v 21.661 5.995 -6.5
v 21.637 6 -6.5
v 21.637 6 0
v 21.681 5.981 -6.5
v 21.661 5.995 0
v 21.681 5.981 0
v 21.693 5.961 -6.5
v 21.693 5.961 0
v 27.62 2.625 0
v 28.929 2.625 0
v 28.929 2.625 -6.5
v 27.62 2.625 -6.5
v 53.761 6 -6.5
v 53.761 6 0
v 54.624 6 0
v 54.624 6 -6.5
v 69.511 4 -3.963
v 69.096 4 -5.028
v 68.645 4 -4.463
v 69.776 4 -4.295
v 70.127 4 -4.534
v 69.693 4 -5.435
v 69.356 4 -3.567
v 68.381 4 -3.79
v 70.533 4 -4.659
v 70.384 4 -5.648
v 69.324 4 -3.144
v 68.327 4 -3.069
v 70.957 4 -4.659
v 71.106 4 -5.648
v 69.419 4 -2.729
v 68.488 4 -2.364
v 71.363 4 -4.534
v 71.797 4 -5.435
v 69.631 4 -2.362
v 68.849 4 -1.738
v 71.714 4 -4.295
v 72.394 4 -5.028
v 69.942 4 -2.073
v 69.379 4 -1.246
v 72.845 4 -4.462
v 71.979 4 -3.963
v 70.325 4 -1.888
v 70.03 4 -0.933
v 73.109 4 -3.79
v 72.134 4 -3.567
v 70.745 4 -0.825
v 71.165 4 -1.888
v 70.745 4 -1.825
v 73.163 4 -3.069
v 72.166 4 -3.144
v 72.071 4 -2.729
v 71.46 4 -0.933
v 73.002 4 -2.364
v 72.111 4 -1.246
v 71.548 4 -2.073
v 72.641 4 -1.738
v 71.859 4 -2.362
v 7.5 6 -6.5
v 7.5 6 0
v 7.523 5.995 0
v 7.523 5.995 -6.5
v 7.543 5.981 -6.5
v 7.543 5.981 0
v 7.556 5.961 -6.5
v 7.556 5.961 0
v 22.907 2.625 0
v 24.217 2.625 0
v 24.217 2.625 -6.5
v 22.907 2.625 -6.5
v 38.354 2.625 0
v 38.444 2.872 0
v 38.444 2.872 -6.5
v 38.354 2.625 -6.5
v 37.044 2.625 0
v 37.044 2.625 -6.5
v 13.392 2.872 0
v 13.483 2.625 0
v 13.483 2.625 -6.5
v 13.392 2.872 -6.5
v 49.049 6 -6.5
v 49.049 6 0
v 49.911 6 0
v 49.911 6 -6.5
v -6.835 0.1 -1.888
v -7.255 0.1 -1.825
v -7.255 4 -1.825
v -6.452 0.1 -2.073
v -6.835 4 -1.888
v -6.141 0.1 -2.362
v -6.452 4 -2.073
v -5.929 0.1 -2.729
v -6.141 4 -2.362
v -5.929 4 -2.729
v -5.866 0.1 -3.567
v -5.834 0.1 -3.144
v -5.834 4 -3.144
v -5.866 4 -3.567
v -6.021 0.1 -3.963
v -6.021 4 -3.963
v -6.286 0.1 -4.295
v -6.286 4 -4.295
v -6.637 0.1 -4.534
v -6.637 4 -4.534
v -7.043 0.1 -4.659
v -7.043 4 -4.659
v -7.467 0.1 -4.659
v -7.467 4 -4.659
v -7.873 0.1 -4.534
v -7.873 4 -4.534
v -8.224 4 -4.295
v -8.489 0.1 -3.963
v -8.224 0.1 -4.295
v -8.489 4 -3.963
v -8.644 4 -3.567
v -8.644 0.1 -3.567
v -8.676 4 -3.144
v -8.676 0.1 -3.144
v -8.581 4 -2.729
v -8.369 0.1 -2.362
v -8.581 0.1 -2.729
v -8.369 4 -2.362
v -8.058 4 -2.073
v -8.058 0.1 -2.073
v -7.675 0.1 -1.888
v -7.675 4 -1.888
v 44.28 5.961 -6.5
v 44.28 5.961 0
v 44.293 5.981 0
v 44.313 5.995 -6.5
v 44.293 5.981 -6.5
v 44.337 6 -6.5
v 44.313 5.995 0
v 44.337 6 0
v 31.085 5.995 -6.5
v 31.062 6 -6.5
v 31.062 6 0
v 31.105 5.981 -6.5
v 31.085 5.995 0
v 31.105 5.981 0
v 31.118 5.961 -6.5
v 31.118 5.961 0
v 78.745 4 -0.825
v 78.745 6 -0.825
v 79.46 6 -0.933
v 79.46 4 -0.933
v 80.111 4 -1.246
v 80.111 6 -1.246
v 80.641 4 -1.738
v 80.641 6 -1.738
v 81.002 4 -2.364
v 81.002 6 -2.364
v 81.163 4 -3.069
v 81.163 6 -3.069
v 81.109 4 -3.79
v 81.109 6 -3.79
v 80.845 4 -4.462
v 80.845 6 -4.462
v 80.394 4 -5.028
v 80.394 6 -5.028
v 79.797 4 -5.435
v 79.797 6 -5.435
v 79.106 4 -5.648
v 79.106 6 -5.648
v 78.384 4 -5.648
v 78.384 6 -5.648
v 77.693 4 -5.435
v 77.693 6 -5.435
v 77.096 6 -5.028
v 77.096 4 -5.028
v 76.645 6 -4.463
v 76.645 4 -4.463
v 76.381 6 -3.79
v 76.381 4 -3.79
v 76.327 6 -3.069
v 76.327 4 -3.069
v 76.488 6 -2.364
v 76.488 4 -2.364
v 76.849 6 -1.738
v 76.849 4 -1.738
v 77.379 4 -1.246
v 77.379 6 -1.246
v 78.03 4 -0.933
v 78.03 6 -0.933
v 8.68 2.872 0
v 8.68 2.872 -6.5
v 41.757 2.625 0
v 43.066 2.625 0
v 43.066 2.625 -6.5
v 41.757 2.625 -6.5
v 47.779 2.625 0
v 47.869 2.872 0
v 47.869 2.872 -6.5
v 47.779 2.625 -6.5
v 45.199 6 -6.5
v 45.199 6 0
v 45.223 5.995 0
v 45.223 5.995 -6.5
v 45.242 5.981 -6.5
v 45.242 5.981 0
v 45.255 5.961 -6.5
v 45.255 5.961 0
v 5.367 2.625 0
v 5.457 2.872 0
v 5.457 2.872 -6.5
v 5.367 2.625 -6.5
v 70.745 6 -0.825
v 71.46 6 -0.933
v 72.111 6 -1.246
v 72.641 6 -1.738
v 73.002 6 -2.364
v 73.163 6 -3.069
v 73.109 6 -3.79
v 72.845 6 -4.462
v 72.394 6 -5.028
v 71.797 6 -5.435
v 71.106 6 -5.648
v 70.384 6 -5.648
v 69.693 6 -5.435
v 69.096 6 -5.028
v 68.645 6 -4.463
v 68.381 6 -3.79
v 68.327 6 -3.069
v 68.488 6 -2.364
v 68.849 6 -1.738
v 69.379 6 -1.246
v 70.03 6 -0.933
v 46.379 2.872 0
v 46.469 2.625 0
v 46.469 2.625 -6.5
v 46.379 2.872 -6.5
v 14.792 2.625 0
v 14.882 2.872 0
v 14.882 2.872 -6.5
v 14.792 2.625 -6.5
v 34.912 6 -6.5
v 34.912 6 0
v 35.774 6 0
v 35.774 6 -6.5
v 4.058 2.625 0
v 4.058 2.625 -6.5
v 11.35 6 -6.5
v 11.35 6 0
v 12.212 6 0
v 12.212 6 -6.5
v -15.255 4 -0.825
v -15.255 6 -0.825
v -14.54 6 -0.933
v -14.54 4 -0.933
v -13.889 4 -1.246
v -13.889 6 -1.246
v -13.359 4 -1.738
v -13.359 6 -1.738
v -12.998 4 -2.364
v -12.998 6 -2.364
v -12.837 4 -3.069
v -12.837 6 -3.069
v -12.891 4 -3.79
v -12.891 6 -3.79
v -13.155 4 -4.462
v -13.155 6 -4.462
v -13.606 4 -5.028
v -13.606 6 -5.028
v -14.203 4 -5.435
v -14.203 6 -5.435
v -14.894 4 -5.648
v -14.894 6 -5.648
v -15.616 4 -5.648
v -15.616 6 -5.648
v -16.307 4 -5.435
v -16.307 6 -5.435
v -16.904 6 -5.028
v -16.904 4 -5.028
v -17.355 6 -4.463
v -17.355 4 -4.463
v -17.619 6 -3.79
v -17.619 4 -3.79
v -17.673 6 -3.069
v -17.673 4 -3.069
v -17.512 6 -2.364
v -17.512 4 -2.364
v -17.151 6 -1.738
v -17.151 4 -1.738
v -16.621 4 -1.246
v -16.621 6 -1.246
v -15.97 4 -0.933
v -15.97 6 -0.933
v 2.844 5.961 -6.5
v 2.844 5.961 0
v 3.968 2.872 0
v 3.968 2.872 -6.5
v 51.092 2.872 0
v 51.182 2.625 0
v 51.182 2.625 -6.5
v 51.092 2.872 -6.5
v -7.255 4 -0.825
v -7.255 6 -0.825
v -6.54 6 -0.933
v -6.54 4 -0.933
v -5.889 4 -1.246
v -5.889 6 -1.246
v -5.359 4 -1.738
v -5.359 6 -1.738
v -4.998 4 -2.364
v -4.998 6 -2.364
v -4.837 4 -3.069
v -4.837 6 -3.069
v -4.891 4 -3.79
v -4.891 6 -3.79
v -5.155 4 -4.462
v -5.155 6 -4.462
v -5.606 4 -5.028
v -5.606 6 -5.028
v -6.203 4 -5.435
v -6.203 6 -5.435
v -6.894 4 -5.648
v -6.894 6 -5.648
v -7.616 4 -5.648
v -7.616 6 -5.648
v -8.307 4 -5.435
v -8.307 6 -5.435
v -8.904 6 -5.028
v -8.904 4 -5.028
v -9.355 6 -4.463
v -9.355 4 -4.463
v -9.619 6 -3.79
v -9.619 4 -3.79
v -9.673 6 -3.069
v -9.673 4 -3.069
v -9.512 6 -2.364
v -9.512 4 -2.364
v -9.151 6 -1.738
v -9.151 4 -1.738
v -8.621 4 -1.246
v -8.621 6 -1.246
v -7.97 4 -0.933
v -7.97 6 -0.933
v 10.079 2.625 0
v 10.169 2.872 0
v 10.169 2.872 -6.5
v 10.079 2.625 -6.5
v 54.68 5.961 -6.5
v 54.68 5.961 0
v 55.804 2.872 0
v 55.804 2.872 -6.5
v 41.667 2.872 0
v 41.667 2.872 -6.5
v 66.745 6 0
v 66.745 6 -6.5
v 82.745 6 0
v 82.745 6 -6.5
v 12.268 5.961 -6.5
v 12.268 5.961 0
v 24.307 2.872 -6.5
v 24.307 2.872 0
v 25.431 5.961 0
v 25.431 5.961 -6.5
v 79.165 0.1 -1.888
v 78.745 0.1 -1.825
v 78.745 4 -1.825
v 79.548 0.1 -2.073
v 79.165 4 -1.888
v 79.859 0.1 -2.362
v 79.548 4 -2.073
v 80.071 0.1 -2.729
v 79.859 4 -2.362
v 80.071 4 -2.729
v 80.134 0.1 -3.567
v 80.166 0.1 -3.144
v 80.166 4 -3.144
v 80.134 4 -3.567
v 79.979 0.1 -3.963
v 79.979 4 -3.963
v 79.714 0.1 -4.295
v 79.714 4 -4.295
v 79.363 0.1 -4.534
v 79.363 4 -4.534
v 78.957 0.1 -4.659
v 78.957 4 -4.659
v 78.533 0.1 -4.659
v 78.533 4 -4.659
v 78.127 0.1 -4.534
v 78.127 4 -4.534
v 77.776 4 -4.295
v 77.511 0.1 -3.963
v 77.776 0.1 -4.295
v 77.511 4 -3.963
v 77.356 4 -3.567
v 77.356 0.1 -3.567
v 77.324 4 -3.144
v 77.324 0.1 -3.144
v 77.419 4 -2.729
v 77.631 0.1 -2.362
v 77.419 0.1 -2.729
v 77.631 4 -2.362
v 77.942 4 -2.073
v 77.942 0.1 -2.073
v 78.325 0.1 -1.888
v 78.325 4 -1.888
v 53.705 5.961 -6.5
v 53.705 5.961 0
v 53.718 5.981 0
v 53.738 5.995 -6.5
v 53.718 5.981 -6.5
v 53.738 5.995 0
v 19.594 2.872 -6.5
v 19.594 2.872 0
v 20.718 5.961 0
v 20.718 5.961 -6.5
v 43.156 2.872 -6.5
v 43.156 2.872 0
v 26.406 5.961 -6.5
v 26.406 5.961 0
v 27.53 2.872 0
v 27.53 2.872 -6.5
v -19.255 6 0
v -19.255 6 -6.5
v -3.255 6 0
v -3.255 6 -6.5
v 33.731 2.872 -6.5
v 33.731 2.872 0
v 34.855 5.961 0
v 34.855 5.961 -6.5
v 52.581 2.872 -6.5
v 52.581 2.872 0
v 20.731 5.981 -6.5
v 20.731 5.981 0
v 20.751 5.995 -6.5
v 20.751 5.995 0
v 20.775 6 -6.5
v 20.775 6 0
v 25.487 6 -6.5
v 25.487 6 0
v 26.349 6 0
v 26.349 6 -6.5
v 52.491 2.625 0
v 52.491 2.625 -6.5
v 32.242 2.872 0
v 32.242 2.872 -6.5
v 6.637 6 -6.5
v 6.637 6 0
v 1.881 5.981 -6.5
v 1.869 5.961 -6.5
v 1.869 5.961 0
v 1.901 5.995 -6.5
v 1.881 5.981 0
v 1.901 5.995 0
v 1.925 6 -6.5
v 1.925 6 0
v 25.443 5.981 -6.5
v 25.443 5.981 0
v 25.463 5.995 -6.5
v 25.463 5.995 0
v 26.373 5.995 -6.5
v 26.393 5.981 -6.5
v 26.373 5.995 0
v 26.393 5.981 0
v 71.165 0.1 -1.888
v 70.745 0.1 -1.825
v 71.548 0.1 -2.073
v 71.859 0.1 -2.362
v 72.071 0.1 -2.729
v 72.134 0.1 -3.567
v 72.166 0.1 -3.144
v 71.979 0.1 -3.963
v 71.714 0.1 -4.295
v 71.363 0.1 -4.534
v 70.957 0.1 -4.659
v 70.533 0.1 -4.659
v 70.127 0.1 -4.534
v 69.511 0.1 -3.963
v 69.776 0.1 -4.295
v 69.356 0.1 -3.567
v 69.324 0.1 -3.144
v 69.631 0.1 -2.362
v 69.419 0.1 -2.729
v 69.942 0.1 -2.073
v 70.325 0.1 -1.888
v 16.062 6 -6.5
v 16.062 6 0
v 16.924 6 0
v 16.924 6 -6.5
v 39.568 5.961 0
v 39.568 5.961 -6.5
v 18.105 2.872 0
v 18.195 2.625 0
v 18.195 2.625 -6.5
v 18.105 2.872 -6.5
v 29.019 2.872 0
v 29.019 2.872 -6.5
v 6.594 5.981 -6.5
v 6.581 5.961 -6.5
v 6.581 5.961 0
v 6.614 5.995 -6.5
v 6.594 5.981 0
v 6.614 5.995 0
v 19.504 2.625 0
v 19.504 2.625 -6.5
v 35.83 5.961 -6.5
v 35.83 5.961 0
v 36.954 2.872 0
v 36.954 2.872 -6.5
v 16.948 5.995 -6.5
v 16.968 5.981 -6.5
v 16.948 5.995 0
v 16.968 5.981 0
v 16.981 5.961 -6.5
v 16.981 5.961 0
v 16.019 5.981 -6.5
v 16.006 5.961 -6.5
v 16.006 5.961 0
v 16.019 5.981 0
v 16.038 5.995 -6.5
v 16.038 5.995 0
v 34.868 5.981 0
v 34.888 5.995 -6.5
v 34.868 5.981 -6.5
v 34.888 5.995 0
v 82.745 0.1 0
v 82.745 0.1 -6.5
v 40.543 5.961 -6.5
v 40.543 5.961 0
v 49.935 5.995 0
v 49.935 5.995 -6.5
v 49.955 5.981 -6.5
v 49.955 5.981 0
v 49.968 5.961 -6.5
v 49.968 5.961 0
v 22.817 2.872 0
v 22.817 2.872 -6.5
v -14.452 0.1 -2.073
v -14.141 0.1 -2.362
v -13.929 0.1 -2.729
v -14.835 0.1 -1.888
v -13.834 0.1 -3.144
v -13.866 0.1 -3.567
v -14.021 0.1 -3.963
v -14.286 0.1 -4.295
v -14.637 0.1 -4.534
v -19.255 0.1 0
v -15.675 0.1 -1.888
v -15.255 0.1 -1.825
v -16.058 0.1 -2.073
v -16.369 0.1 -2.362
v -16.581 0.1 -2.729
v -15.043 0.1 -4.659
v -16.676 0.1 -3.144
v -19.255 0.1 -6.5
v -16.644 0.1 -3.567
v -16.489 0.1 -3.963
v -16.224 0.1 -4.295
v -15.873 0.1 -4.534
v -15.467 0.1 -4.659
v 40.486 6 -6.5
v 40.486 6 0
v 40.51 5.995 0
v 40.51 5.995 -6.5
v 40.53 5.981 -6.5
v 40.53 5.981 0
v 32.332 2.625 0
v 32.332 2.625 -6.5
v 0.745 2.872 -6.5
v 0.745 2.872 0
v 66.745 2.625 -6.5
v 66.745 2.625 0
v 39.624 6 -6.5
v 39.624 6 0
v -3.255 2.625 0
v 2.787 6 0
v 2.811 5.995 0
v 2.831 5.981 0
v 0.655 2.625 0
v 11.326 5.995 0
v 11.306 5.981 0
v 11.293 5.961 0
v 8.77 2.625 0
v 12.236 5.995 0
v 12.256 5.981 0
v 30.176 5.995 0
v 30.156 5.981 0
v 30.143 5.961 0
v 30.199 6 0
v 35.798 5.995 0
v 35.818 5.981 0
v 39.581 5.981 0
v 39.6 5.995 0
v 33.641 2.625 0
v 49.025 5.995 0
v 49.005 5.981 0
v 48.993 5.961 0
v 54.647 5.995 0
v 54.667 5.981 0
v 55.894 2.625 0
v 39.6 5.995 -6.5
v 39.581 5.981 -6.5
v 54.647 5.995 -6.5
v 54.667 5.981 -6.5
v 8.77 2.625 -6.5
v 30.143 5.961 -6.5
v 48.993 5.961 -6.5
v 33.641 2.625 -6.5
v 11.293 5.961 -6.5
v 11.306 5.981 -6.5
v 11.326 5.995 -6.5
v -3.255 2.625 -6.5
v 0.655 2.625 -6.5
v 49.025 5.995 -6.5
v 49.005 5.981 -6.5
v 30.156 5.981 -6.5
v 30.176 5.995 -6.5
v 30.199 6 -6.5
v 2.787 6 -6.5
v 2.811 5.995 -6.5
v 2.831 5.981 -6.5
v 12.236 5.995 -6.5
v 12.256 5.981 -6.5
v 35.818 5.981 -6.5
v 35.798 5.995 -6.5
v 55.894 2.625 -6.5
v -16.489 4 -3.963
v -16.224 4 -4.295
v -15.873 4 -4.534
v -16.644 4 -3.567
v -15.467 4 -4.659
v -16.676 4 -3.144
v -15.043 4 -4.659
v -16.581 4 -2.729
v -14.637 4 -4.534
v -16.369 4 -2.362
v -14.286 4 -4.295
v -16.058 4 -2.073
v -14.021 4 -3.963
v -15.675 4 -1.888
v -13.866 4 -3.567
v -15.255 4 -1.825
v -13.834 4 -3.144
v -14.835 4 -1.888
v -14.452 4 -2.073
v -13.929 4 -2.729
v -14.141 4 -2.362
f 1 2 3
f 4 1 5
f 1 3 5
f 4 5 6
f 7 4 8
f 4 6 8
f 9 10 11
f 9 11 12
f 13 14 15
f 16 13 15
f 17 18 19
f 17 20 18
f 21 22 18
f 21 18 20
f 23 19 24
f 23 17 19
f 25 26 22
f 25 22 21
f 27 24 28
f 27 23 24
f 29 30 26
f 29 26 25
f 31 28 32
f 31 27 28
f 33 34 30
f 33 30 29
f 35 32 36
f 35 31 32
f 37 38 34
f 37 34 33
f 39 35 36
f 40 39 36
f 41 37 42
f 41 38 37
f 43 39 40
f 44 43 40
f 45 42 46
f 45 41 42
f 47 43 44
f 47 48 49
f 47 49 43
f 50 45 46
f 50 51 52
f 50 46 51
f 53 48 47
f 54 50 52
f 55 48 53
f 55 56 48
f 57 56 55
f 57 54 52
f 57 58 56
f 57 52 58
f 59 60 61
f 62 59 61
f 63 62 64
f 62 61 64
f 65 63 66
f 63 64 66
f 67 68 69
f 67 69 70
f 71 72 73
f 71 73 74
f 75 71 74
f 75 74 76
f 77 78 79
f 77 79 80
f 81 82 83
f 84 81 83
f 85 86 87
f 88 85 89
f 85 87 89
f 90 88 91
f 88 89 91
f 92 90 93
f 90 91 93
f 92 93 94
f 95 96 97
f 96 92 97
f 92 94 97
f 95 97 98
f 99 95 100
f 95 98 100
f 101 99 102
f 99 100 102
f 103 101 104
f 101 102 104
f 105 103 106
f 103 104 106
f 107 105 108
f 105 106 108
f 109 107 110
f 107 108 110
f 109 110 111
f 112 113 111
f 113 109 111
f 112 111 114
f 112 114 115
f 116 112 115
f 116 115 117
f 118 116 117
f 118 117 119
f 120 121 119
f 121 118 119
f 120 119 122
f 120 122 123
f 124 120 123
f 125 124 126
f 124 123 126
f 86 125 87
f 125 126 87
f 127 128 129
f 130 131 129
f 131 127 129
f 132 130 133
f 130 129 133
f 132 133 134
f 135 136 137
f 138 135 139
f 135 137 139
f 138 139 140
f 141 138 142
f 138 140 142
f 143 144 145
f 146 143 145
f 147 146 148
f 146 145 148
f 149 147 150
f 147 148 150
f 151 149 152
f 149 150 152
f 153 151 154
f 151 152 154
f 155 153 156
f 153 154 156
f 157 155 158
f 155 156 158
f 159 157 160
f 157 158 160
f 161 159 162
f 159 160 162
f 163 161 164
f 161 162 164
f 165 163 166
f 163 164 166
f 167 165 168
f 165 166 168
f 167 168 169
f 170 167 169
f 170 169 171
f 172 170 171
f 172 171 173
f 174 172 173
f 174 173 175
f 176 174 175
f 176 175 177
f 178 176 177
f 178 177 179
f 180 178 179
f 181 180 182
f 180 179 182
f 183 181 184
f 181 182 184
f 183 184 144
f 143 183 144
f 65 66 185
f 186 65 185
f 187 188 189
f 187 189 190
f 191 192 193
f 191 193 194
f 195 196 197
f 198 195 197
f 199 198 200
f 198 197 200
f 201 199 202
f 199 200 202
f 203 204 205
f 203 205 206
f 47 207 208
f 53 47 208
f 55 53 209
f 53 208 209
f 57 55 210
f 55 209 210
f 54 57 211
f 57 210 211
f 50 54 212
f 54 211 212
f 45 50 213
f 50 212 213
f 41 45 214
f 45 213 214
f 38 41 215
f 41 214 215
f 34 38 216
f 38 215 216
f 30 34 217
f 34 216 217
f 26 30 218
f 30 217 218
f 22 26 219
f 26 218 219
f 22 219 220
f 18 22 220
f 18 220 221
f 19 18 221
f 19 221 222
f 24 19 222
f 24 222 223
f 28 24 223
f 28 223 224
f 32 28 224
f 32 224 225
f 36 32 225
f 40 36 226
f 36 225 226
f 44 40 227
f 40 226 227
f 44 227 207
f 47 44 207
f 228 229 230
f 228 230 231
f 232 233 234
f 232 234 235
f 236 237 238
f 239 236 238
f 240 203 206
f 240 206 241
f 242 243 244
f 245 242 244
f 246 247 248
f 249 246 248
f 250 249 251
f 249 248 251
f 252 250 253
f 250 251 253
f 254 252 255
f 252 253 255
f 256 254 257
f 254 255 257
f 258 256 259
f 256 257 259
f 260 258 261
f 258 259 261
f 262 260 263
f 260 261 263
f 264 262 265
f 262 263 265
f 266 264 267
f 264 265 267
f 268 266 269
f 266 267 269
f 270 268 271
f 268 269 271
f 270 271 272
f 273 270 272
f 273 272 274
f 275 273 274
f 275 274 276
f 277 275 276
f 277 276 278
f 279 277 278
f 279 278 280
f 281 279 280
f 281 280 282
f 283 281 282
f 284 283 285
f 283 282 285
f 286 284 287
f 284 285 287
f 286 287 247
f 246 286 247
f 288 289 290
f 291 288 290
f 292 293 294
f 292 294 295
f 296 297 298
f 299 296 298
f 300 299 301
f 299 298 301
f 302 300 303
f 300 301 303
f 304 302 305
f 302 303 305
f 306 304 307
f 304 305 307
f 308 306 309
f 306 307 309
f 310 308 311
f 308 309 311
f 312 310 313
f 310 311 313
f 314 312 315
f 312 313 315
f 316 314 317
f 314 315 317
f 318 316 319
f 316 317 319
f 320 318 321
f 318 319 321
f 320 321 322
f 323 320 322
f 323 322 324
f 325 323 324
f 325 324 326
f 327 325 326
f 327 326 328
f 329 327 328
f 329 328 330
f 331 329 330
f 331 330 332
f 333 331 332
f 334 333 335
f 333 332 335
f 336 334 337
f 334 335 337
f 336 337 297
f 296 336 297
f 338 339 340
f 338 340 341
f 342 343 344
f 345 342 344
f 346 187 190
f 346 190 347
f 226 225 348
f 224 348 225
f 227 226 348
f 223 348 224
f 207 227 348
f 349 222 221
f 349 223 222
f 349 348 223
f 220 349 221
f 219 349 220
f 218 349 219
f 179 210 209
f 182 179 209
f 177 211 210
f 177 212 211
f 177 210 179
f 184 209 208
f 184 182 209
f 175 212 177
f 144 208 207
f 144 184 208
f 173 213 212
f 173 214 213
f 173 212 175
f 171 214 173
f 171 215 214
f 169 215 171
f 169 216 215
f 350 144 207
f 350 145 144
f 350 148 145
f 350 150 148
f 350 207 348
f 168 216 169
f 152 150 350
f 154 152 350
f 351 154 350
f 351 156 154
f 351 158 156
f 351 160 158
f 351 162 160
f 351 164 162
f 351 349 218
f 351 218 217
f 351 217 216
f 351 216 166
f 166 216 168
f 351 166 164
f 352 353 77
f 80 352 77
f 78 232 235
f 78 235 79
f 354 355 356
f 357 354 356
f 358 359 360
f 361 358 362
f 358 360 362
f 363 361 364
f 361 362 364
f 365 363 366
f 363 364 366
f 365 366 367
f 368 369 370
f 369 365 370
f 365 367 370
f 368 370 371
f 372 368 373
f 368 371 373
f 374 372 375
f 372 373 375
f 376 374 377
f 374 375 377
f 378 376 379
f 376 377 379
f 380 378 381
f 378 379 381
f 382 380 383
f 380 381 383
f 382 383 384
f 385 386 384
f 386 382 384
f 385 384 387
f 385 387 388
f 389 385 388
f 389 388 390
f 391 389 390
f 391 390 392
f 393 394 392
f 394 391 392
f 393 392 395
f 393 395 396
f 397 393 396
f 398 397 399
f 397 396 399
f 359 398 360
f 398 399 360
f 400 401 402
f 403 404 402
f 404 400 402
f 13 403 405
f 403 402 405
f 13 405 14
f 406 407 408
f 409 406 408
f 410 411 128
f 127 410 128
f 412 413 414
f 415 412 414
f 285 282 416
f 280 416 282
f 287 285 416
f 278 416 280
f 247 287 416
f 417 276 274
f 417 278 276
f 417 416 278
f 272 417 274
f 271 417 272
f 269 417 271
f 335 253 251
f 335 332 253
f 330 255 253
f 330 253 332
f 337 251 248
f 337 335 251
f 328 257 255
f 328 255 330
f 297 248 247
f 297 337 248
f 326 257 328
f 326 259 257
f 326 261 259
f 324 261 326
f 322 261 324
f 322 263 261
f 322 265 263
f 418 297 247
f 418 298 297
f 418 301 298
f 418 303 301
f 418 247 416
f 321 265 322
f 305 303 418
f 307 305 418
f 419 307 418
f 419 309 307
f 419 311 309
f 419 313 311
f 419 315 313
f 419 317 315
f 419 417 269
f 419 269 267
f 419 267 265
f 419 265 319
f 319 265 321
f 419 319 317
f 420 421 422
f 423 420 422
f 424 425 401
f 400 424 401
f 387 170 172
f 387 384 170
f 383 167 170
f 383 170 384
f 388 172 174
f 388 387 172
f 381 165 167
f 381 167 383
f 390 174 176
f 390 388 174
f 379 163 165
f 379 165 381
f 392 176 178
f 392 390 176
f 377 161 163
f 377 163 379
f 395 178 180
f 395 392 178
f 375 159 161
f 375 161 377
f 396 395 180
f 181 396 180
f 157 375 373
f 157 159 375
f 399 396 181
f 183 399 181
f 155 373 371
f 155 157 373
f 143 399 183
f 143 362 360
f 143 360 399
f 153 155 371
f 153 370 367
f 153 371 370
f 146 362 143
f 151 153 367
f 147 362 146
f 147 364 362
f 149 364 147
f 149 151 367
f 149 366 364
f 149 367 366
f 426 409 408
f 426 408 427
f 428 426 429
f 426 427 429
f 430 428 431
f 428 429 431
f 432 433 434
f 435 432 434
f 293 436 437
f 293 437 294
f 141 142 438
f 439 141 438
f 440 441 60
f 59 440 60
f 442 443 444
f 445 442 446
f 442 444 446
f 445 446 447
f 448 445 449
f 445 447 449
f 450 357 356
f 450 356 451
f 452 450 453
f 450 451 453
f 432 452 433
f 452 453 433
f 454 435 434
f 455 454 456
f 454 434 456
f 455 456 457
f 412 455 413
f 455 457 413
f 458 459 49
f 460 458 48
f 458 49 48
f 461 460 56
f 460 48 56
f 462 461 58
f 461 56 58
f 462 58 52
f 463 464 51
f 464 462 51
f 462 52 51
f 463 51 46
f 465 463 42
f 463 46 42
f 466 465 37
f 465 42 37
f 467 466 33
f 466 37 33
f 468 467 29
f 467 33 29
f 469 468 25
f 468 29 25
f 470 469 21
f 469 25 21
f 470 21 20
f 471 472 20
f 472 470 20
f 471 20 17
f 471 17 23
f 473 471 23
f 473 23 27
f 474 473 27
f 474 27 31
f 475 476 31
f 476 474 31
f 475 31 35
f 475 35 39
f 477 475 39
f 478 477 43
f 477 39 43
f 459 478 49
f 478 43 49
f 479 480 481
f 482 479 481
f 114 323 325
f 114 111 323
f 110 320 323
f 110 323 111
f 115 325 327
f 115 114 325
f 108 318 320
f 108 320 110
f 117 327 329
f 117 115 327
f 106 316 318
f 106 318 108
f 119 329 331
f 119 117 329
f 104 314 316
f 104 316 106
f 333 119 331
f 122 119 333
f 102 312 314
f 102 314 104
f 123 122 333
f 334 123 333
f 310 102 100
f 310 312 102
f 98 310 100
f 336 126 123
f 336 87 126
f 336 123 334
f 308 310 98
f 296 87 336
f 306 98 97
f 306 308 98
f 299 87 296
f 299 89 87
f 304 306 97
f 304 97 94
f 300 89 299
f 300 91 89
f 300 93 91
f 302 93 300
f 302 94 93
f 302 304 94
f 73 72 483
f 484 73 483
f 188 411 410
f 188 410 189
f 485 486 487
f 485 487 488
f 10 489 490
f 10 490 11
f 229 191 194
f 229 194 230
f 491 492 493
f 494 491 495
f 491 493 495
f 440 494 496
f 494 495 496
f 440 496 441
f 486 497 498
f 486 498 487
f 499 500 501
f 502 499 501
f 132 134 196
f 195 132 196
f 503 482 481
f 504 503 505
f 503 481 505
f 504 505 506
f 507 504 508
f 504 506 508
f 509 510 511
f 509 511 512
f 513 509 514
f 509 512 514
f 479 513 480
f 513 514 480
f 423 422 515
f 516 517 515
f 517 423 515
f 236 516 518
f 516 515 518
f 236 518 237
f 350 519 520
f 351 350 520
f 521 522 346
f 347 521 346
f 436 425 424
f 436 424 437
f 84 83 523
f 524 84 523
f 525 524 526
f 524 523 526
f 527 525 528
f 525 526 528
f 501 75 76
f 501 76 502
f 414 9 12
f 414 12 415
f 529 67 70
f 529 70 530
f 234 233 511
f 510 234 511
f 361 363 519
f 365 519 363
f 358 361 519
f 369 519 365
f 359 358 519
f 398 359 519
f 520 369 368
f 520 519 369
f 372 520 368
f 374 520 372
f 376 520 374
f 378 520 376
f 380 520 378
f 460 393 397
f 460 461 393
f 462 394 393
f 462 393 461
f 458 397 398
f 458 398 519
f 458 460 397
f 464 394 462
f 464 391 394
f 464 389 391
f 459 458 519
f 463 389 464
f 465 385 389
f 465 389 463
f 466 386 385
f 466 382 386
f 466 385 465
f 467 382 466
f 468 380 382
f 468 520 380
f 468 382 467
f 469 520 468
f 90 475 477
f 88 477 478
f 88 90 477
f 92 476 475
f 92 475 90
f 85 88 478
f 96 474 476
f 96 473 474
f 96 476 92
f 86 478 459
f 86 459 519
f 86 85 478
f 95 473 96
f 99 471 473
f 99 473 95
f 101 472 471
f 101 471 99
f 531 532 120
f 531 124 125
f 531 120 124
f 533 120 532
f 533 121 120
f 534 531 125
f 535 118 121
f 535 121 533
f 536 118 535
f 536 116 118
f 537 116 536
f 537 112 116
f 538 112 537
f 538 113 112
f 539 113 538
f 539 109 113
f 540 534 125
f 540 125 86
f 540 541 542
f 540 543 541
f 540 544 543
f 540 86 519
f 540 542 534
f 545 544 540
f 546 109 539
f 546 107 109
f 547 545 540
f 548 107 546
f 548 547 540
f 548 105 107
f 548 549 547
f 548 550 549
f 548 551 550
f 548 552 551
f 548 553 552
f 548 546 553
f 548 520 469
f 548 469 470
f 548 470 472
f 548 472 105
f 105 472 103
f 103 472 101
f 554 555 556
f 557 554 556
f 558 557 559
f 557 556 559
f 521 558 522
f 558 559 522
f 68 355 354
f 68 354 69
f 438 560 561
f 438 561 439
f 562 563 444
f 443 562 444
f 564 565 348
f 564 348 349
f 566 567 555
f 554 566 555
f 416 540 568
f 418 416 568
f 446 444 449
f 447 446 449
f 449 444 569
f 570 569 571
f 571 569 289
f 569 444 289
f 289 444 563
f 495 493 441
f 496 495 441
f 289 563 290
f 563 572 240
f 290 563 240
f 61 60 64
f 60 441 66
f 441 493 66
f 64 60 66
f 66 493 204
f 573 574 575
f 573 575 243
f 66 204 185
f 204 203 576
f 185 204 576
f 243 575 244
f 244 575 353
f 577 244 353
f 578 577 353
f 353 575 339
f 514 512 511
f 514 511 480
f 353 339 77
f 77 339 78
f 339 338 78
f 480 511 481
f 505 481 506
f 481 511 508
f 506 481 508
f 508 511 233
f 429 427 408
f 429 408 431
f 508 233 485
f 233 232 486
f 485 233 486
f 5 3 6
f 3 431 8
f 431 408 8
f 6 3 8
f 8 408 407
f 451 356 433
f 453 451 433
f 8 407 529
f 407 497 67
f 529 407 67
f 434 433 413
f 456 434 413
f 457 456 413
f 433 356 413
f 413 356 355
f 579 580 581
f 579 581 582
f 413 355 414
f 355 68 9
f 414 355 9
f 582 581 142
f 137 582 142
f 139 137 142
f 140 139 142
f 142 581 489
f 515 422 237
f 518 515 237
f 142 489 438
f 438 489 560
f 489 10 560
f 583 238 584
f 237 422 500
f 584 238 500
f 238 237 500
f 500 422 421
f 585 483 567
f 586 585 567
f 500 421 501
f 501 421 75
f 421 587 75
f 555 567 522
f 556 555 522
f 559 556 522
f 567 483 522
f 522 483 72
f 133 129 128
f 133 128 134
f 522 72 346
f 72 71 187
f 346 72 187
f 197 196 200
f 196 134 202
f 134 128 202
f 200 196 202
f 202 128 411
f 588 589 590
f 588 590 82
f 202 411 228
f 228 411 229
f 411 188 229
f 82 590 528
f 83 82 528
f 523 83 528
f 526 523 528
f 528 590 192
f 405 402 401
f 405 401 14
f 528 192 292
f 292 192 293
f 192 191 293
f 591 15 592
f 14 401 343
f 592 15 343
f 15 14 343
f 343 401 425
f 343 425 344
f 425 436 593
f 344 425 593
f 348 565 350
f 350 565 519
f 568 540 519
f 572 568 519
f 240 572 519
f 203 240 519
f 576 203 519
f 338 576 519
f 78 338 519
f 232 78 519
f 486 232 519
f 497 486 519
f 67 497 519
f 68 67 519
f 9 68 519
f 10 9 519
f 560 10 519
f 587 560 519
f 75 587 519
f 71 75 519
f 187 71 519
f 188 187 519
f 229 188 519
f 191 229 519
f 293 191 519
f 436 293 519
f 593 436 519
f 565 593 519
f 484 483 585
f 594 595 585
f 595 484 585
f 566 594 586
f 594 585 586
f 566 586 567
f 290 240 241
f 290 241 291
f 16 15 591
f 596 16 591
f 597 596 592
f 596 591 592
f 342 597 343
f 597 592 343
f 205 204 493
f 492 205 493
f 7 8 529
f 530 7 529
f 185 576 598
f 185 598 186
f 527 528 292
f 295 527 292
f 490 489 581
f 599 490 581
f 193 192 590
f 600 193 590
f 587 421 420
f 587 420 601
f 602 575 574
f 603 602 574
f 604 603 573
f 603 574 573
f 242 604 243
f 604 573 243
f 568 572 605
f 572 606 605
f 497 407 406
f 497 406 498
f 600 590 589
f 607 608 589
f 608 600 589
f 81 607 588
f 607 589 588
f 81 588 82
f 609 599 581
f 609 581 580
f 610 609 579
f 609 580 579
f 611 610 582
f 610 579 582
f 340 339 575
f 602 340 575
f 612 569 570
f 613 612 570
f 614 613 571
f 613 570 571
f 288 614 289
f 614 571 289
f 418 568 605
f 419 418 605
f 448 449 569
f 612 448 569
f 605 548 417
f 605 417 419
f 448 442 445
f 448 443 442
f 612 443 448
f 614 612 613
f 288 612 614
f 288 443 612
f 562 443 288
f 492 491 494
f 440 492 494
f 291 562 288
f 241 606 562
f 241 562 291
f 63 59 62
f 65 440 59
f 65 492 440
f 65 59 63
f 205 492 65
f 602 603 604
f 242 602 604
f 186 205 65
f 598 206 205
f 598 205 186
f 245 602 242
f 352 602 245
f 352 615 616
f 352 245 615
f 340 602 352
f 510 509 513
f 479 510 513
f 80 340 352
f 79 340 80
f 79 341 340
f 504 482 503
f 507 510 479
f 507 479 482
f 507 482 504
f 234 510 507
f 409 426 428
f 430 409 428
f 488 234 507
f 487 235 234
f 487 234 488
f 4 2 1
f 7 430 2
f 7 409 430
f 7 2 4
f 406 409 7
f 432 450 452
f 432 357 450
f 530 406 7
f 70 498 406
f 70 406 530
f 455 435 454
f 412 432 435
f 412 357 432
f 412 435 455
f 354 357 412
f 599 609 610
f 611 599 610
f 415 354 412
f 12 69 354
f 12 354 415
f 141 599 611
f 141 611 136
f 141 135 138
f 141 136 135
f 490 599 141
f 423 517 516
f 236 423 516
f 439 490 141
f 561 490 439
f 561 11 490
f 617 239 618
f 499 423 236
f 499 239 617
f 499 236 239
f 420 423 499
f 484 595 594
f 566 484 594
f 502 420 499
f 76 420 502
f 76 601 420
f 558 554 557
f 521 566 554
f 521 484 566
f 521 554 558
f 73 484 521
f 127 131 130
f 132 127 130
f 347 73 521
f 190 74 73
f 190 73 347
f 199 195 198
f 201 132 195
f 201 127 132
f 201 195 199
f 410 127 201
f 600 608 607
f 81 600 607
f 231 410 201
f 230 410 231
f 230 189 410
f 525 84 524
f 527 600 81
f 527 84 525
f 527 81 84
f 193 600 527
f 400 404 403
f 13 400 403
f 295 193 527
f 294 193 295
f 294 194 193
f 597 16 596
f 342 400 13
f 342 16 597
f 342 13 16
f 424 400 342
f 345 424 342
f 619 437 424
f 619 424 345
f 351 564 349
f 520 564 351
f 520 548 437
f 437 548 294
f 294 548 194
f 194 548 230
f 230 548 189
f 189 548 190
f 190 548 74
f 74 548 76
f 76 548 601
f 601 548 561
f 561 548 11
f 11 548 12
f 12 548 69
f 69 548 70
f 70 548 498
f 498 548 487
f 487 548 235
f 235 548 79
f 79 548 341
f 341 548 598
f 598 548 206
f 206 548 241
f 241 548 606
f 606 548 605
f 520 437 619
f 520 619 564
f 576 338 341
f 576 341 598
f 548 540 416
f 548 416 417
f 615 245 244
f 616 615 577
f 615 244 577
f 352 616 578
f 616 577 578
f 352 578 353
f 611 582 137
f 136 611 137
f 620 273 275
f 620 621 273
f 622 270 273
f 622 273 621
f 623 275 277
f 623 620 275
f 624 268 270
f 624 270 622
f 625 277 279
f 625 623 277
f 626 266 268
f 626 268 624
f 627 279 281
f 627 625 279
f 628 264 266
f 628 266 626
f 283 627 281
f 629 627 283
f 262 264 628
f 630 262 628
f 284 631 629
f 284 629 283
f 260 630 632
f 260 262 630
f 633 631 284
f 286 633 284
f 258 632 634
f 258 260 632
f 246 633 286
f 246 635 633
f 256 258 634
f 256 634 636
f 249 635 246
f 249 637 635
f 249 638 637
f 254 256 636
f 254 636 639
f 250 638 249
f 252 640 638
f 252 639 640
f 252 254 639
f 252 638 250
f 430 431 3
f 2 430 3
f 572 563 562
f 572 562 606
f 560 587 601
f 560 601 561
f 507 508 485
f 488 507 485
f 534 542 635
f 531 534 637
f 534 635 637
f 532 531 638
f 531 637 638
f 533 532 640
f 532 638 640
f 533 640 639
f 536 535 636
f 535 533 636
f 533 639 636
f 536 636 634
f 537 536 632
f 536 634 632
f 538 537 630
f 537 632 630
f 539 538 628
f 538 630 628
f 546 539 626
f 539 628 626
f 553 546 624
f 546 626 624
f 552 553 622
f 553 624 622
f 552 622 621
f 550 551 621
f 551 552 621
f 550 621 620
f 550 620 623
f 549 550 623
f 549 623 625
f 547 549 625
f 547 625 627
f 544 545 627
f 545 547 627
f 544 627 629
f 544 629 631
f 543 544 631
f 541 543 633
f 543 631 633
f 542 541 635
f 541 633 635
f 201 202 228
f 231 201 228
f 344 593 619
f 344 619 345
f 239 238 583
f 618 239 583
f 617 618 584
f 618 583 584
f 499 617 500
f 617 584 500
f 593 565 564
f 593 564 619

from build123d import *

# Parameters (mm, degrees)
BLANKSKE_W          = 56.5
BLANKSKE_H          = 6
BLANK_DEPTH         = 6.5
TOOTHCUTILL_DEPTH   = 58.188285514
TOOTHCUTSIM_DEPTH   = 58.188285514
TEETHCUTS_COUNT     = 13
TEETHCUTS_PITCH     = 4.712388975
SKETCH_4_W          = 19.255
SKETCH_4_H          = 6.5
SKETCH_4_W_2        = 26.245
EXTRUDE_1_DEPTH     = 2.625
SKETCH_5_W          = 16
SKETCH_5_H          = 6.5
EXTRUDE_2_DEPTH     = 3.375
SKETCH_8_R          = 1.425
CUT_EXTRUDE_1_DEPTH = 84.216494909
SKETCH_11_R         = 2.425
SKETCH_11_R_2       = 1.425
CUT_EXTRUDE_2_DEPTH = 2
CUT_EXTRUDE_START   = -0.1
SKETCH_14_W         = 102
SKETCH_14_H         = 6.5
SKETCH_14_R         = 1.425
CUT_EXTRUDE_3_DEPTH = 0.1


with BuildPart() as part:
    # BlankSke → Blank (new body)
    with BuildSketch(Plane.XY):
        with Locations((28.25, 3)):
            Rectangle(BLANKSKE_W, BLANKSKE_H)
    extrude(amount=-BLANK_DEPTH)

    # TooCutSkeIll → ToothCutIll (cut, through all)
    with BuildSketch(Plane.XY):
        with BuildLine():
            Line((-1.86868349, 5.960521209), (-0.744699446, 2.872400426))
            ThreePointArc((-0.744699446, 2.872400426), (-0.60703976, 2.692998831), (-0.39137502, 2.625))
            Line((-0.39137502, 2.625), (0.39137502, 2.625))
            ThreePointArc((0.39137502, 2.625), (0.60703976, 2.692998831), (0.744699446, 2.872400426))
            Line((0.744699446, 2.872400426), (1.86868349, 5.960521209))
            ThreePointArc((1.86868349, 5.960521209), (1.890650461, 5.989149123), (1.925065047, 6))
            Line((1.925065047, 6), (1.925065047, 6.0254))
            Line((1.925065047, 6.0254), (-1.925065047, 6.0254))
            Line((-1.925065047, 6.0254), (-1.925065047, 6))
            ThreePointArc((-1.925065047, 6), (-1.890650461, 5.989149123), (-1.86868349, 5.960521209))
        make_face()
    toothcutill = extrude(amount=-TOOTHCUTILL_DEPTH, mode=Mode.SUBTRACT)

    # TooCutSkeSim → ToothCutSim (cut, through all)
    with BuildSketch(Plane.XY):
        Polygon((0.654653055, 2.625), (-0.654653055, 2.625), (-1.892297439, 6.0254), (1.892297439, 6.0254), align=None)
    toothcutsim = extrude(amount=-TOOTHCUTSIM_DEPTH, mode=Mode.SUBTRACT)

    # TeethCuts: ToothCutIll, ToothCutSim ×13
    with Locations(*[(i * TEETHCUTS_PITCH, 0, 0) for i in range(1, TEETHCUTS_COUNT)]):
        add(toothcutill, mode=Mode.SUBTRACT)
        add(toothcutsim, mode=Mode.SUBTRACT)

    # 草图4 → 凸台-拉伸1 (add)
    with BuildSketch(Plane(origin=(0, 0, 0), x_dir=(-1, 0, 0), z_dir=(0, -1, 0))):
        with Locations((9.6275, 3.25)):
            Rectangle(SKETCH_4_W, SKETCH_4_H)
        with Locations((-69.6225, 3.25)):
            Rectangle(SKETCH_4_W_2, SKETCH_4_H)
    extrude(amount=-EXTRUDE_1_DEPTH)

    # 草图5 → 凸台-拉伸2 (add)
    with BuildSketch(Plane(origin=(0, 2.625, 0), x_dir=(1, 0, 0), z_dir=(0, 1, 0))):
        with Locations((-11.255, 3.25)):
            Rectangle(SKETCH_5_W, SKETCH_5_H)
        with Locations((74.745, 3.25)):
            Rectangle(SKETCH_5_W, SKETCH_5_H)
    extrude(amount=EXTRUDE_2_DEPTH)

    # 草图8 → 切除-拉伸1 (cut, through all)
    with BuildSketch(Plane(origin=(0, 6, 0), x_dir=(1, 0, 0), z_dir=(0, 1, 0))):
        with Locations(Location((-15.255, 3.25, 0), (0, 0, 270))):
            Circle(SKETCH_8_R)
        with Locations(Location((-7.255, 3.25, 0), (0, 0, 270))):
            Circle(SKETCH_8_R)
        with Locations(Location((78.745, 3.25, 0), (0, 0, 270))):
            Circle(SKETCH_8_R)
        with Locations(Location((70.745, 3.25, 0), (0, 0, 270))):
            Circle(SKETCH_8_R)
    extrude(amount=-CUT_EXTRUDE_1_DEPTH, mode=Mode.SUBTRACT)

    # 草图11 → 切除-拉伸2 (cut)
    # profile 1 of 4: a face of its own
    with BuildSketch(Plane(origin=(0, 6, 0), x_dir=(1, 0, 0), z_dir=(0, 1, 0))):
        with Locations(Location((70.745, 3.25, 0), (0, 0, 270))):
            Circle(SKETCH_11_R)
        with Locations(Location((70.745, 3.25, 0), (0, 0, 270))):
            Circle(SKETCH_11_R_2, mode=Mode.SUBTRACT)
    # profile 2 of 4: a face of its own
    with BuildSketch(Plane(origin=(0, 6, 0), x_dir=(1, 0, 0), z_dir=(0, 1, 0))):
        with Locations(Location((78.745, 3.25, 0), (0, 0, 270))):
            Circle(SKETCH_11_R)
        with Locations(Location((78.745, 3.25, 0), (0, 0, 270))):
            Circle(SKETCH_11_R_2, mode=Mode.SUBTRACT)
    # profile 3 of 4: a face of its own
    with BuildSketch(Plane(origin=(0, 6, 0), x_dir=(1, 0, 0), z_dir=(0, 1, 0))):
        with Locations(Location((-7.255, 3.25, 0), (0, 0, 270))):
            Circle(SKETCH_11_R)
        with Locations(Location((-7.255, 3.25, 0), (0, 0, 270))):
            Circle(SKETCH_11_R_2, mode=Mode.SUBTRACT)
    # profile 4 of 4: a face of its own
    with BuildSketch(Plane(origin=(0, 6, 0), x_dir=(1, 0, 0), z_dir=(0, 1, 0))):
        with Locations(Location((-15.255, 3.25, 0), (0, 0, 270))):
            Circle(SKETCH_11_R)
        with Locations(Location((-15.255, 3.25, 0), (0, 0, 270))):
            Circle(SKETCH_11_R_2, mode=Mode.SUBTRACT)
    extrude(amount=-CUT_EXTRUDE_2_DEPTH, mode=Mode.SUBTRACT)

    # 草图14 → 切除-拉伸3 (cut)
    with BuildSketch(Plane(origin=(0, 0, 0), x_dir=(-1, 0, 0), z_dir=(0, -1, 0)).offset(CUT_EXTRUDE_START)):
        with Locations((-31.745, 3.25)):
            Rectangle(SKETCH_14_W, SKETCH_14_H)
        with Locations(Location((15.255, 3.25, 0), (0, 0, 270))):
            Circle(SKETCH_14_R, mode=Mode.SUBTRACT)
        with Locations(Location((7.255, 3.25, 0), (0, 0, 270))):
            Circle(SKETCH_14_R, mode=Mode.SUBTRACT)
        with Locations(Location((-70.745, 3.25, 0), (0, 0, 270))):
            Circle(SKETCH_14_R, mode=Mode.SUBTRACT)
        with Locations(Location((-78.745, 3.25, 0), (0, 0, 270))):
            Circle(SKETCH_14_R, mode=Mode.SUBTRACT)
    extrude(amount=CUT_EXTRUDE_3_DEPTH, mode=Mode.SUBTRACT)


solid = part.part
